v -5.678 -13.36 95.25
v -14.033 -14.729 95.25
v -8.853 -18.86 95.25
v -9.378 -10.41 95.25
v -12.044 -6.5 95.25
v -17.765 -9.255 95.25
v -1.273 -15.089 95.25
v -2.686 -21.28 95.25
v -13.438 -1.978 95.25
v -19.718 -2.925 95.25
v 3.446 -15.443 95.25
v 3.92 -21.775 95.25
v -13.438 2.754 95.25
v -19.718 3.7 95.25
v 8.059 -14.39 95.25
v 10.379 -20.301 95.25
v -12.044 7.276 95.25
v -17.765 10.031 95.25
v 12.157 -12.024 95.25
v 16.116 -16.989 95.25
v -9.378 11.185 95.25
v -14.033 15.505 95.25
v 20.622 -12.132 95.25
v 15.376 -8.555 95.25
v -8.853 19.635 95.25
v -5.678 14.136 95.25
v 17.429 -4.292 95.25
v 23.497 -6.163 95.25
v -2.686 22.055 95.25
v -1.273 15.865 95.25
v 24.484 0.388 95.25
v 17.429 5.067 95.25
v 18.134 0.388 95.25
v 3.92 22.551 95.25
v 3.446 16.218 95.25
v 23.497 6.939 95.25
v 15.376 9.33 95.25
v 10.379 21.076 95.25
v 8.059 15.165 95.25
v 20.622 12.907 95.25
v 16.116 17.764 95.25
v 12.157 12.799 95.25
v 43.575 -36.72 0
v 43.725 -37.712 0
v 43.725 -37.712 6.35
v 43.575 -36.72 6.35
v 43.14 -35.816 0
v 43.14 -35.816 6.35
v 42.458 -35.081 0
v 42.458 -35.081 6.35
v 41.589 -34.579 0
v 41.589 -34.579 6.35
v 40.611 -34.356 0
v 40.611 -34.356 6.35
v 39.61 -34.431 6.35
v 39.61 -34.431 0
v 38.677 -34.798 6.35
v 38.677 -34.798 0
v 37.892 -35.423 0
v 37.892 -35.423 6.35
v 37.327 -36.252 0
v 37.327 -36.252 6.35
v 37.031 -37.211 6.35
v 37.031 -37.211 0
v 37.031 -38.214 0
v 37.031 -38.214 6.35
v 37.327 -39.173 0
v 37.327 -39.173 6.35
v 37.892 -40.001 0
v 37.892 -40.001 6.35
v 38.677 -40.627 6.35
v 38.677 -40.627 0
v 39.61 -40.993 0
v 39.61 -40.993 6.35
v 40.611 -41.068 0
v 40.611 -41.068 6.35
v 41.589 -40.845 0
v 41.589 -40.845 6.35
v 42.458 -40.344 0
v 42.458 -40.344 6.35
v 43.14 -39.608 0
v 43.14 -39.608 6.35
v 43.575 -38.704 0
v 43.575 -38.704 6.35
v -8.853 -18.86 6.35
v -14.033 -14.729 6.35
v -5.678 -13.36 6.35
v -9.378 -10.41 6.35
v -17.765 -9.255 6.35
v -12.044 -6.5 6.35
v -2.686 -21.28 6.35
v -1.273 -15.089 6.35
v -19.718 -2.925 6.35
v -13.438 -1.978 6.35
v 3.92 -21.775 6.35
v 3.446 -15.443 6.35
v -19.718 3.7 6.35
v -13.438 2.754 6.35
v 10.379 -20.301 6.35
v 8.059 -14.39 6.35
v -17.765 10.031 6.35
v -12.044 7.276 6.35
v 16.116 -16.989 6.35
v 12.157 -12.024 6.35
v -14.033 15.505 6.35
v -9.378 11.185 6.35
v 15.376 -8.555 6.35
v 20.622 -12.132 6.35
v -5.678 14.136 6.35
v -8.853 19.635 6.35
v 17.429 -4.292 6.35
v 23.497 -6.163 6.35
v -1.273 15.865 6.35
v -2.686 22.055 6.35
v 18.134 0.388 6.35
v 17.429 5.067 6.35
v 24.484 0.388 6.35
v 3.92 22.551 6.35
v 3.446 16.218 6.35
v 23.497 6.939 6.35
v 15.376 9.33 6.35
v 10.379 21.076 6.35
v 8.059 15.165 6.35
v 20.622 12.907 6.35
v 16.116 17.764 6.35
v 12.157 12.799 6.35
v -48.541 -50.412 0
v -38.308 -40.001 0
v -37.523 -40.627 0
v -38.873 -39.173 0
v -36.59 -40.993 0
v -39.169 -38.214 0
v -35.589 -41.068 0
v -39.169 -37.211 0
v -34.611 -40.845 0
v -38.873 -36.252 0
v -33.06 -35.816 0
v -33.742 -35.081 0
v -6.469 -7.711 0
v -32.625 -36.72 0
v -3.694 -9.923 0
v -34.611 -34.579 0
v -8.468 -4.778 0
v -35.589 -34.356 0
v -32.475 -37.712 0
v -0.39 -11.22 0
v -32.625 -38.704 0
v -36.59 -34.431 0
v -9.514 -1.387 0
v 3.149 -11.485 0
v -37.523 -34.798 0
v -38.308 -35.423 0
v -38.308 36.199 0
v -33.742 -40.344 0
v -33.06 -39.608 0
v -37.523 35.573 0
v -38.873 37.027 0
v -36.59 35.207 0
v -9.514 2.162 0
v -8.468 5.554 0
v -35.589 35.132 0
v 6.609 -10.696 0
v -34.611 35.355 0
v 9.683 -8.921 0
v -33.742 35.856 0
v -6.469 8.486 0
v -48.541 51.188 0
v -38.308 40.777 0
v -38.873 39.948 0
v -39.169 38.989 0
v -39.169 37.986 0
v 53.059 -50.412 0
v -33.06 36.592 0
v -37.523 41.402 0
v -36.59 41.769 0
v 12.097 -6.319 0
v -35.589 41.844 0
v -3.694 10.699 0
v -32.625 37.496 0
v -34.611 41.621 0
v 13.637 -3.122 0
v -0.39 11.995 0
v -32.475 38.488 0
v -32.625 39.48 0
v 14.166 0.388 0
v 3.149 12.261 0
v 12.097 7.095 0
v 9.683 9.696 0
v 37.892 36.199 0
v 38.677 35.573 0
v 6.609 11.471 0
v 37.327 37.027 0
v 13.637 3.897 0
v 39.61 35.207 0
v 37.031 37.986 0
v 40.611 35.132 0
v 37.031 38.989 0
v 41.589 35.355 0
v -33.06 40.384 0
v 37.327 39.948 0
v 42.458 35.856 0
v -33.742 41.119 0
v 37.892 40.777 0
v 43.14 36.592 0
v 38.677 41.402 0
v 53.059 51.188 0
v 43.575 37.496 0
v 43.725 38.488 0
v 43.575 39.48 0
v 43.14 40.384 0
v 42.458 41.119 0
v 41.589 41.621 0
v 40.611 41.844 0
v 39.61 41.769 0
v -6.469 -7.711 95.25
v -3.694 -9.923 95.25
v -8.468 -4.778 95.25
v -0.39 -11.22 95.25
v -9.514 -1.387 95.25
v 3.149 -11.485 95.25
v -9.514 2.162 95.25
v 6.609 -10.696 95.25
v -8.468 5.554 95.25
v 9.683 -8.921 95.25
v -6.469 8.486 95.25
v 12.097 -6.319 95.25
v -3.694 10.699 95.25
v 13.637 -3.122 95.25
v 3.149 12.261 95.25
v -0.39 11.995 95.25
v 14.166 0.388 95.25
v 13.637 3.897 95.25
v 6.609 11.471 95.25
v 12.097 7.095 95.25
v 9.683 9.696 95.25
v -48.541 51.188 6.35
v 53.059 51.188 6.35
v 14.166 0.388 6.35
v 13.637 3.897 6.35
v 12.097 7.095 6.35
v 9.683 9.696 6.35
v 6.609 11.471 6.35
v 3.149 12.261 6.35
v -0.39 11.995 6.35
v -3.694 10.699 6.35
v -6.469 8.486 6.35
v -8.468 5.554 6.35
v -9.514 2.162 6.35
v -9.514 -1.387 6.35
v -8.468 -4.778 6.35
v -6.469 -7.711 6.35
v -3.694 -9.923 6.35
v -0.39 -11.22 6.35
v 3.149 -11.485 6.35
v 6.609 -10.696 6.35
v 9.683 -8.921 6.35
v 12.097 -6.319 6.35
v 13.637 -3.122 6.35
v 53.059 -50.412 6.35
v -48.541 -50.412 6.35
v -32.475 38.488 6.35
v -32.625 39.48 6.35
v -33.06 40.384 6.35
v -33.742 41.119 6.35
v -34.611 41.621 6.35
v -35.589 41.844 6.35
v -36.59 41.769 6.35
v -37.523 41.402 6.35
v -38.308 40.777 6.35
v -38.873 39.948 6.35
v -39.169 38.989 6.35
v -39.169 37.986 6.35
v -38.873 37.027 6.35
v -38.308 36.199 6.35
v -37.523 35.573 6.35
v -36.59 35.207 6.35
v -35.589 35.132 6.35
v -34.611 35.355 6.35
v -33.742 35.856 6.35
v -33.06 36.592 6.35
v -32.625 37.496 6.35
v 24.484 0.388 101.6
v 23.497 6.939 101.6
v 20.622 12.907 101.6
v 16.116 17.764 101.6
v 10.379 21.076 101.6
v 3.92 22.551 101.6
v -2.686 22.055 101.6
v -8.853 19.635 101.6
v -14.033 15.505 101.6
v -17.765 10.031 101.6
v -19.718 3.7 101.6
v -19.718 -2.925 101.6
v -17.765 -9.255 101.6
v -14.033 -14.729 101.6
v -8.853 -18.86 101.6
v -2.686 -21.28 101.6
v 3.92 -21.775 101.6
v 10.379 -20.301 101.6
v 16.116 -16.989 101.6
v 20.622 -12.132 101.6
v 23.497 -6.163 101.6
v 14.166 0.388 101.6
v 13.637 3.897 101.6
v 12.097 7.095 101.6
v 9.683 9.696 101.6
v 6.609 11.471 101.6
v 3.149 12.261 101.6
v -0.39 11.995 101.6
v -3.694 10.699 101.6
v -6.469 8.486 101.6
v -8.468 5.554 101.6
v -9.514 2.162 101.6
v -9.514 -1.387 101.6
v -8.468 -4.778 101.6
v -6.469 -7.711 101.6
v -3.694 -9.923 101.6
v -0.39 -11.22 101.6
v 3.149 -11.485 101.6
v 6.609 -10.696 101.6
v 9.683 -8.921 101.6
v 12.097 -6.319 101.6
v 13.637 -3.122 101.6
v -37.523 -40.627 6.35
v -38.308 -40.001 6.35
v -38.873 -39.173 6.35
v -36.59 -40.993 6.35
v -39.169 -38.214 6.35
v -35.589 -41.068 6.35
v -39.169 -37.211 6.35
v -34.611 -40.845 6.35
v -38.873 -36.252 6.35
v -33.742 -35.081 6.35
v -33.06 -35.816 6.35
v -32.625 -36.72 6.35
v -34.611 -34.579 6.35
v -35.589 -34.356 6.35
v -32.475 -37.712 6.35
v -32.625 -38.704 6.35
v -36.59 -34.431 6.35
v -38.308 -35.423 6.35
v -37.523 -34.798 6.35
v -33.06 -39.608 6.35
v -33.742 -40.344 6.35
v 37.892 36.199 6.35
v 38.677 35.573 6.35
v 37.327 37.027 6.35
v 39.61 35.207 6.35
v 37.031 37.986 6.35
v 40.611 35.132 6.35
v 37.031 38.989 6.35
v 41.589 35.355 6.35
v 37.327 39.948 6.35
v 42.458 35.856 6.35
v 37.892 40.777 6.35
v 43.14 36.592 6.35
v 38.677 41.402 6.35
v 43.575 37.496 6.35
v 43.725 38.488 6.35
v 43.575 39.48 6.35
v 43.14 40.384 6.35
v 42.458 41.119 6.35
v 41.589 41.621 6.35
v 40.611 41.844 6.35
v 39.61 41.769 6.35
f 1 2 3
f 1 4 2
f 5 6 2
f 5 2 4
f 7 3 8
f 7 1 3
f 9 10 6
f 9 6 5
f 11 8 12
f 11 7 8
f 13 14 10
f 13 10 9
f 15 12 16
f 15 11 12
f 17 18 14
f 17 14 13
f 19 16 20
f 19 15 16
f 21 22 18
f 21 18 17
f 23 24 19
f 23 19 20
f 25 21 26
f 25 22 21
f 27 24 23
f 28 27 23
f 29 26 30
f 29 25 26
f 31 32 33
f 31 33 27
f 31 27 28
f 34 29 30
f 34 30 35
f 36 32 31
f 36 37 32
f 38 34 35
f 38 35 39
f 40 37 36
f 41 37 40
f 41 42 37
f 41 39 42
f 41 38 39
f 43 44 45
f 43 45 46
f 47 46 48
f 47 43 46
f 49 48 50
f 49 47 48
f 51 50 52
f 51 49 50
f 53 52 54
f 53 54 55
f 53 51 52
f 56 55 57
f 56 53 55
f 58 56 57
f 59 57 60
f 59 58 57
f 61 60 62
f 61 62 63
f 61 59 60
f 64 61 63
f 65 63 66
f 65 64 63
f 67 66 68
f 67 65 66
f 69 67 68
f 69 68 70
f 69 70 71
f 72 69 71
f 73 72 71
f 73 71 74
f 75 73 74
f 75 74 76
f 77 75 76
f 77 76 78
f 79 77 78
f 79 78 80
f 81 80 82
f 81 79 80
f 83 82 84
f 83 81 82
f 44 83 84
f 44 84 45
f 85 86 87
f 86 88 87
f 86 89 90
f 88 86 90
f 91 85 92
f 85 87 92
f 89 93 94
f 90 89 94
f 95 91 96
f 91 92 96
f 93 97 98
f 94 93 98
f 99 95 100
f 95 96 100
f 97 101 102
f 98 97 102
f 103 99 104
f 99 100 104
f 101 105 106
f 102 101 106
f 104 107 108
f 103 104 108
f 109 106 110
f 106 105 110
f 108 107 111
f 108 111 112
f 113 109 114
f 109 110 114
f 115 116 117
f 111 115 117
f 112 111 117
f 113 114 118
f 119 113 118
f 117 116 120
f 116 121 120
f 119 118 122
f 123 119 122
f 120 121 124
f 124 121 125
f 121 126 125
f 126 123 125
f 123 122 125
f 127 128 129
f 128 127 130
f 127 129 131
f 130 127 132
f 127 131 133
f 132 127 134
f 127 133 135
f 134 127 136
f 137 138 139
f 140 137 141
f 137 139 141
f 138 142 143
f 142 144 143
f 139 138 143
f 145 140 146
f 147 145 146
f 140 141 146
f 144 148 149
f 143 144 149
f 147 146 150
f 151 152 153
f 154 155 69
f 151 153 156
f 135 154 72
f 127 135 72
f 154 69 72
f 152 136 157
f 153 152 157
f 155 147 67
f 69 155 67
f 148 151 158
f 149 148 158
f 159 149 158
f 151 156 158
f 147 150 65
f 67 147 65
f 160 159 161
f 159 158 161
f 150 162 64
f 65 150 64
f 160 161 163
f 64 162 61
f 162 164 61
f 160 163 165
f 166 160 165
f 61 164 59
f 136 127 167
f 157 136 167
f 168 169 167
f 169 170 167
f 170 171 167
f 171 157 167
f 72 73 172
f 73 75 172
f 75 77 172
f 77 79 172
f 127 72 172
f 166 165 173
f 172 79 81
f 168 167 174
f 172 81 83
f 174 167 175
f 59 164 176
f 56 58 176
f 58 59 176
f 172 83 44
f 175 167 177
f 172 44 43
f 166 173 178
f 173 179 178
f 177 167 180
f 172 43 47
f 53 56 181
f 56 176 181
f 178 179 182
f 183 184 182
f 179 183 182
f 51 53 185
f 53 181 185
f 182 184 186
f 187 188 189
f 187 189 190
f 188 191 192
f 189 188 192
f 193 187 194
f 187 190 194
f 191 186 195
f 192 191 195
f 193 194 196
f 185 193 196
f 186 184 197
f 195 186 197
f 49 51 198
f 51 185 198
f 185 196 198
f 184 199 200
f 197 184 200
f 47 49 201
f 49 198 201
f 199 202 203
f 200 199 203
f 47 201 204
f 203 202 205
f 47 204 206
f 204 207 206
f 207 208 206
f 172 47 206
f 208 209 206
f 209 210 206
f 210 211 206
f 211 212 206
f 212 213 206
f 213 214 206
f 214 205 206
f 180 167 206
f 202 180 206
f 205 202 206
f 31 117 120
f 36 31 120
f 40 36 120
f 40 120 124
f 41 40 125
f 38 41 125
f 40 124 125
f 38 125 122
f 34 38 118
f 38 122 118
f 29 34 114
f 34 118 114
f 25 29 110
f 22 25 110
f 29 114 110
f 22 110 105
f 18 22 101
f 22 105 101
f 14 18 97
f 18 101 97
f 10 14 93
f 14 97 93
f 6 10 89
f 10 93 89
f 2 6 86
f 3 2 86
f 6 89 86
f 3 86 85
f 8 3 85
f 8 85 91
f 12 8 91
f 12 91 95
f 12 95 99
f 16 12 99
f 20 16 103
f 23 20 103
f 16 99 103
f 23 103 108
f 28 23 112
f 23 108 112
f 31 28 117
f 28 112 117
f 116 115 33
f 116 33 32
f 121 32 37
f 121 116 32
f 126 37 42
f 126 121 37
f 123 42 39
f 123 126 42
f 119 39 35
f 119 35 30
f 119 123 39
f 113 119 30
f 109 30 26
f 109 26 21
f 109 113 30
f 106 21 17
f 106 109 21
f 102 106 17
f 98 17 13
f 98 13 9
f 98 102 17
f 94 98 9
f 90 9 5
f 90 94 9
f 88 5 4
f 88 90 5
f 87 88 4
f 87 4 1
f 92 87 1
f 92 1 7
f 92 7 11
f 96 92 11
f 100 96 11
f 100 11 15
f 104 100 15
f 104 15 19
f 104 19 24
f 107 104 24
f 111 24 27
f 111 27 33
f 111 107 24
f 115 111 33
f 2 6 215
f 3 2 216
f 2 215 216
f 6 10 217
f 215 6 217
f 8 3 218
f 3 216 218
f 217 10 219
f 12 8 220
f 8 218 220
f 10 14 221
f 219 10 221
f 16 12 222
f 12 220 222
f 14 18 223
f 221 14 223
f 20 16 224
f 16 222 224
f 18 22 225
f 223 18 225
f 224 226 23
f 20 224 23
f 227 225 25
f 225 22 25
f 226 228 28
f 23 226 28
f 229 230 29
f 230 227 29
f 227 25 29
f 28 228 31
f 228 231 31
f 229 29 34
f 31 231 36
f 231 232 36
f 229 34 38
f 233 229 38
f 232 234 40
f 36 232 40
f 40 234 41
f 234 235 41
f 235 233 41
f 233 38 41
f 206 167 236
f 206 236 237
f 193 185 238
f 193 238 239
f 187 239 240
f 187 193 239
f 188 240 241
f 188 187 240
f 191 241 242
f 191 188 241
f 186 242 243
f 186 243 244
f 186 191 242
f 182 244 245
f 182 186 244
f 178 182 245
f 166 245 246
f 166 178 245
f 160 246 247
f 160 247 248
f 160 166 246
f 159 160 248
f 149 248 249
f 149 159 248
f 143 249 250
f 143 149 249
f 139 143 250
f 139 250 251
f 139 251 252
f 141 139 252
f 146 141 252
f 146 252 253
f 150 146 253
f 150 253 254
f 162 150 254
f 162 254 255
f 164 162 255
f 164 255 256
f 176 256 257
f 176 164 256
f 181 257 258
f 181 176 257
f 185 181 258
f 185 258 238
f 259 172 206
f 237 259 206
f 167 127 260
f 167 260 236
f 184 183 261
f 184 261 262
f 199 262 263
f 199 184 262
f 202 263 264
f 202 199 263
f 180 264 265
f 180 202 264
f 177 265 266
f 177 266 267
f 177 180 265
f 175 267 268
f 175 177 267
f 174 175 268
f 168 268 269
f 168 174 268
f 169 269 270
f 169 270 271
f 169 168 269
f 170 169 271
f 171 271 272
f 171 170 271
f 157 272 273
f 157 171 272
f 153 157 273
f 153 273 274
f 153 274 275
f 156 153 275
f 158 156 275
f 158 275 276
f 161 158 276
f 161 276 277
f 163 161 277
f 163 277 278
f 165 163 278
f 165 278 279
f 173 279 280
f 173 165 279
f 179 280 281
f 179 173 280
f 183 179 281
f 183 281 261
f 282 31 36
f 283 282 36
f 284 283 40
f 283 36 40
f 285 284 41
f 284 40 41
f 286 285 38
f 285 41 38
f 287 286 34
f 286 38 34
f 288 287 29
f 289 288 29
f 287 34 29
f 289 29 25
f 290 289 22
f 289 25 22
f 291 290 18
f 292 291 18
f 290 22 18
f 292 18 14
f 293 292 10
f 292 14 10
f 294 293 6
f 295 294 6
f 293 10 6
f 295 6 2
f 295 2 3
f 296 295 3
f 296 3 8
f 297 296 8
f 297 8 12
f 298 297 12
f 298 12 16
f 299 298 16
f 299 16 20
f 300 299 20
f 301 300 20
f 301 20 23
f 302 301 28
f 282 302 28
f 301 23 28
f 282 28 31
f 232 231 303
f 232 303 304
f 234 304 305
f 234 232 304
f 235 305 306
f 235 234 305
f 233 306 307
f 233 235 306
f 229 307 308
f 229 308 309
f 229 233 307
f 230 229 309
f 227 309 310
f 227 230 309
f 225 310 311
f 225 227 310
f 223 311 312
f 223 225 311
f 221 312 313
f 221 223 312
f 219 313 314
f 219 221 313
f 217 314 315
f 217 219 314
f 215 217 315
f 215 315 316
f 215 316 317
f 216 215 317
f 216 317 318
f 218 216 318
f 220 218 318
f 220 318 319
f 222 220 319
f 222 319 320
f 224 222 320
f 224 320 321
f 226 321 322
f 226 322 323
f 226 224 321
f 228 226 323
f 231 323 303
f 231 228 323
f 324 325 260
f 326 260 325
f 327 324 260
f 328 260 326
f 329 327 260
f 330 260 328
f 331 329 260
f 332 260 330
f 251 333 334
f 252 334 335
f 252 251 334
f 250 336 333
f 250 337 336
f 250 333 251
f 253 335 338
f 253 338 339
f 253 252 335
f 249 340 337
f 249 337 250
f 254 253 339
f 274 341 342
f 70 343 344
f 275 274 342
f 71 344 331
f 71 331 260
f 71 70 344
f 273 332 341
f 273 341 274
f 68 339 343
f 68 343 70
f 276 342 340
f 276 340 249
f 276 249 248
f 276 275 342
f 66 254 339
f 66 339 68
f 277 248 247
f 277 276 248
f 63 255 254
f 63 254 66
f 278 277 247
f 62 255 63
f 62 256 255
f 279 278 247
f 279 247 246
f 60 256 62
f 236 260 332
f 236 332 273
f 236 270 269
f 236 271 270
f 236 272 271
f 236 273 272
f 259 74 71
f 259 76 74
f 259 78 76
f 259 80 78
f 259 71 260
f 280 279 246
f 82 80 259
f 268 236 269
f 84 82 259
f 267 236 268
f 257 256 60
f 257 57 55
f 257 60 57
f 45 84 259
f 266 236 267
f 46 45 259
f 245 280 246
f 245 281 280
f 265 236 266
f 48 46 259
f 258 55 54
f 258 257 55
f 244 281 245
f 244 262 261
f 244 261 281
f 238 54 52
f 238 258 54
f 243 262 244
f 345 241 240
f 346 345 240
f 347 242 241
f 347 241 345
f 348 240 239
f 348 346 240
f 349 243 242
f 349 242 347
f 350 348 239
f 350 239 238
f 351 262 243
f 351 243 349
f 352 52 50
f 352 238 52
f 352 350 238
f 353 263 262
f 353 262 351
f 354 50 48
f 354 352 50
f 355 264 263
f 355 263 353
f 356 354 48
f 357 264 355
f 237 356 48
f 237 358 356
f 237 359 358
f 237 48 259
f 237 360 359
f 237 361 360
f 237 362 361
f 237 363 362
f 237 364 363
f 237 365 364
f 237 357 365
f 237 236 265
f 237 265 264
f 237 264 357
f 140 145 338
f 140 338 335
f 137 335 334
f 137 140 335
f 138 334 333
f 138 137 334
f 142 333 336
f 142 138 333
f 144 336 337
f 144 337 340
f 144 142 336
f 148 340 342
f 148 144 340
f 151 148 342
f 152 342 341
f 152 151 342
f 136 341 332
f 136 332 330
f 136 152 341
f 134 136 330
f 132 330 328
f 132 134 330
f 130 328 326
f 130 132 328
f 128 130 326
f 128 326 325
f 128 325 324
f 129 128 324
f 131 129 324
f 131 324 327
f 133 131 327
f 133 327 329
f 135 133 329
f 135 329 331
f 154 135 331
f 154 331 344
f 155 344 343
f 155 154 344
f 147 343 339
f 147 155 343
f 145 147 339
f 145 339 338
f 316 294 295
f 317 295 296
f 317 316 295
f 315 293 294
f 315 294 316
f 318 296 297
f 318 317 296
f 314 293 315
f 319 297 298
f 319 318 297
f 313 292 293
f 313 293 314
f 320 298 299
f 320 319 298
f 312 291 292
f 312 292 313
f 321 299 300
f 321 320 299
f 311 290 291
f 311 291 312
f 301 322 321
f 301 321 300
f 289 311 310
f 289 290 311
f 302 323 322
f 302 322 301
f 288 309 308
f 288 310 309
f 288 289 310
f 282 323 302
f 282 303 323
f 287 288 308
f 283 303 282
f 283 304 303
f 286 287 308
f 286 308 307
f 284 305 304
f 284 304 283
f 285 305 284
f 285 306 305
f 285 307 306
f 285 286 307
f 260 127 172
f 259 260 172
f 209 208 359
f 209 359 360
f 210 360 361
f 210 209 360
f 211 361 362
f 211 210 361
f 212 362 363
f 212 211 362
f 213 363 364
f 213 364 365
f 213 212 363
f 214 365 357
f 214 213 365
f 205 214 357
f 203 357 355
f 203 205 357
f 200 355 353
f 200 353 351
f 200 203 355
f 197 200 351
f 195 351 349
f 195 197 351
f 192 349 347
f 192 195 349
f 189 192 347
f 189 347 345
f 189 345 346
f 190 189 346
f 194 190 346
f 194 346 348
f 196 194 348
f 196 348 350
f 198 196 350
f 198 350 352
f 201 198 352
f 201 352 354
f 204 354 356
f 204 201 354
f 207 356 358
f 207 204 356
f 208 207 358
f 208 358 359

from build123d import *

# Parameters (mm, degrees)
F0_W     = 101.6
F0_H     = 101.6
F0_R     = 3.3655
F0_R_2   = 11.90625
F1_DEPTH = 6.35
F2_R     = 22.225
F2_R_2   = 15.875
F3_DEPTH = 88.9
F4_R     = 22.225
F4_R_2   = 11.90625
F5_DEPTH = 6.35


with BuildPart() as f1:
    # F0 (on Top) → F1 (new body)
    with BuildSketch(Plane.XY):
        with Locations((2.259261, 0.38768)):
            Rectangle(F0_W, F0_H)
        with Locations((-35.840739, -37.71232)):
            Circle(F0_R, mode=Mode.SUBTRACT)
        with Locations((40.359261, -37.71232)):
            Circle(F0_R, mode=Mode.SUBTRACT)
        with Locations((-35.840739, 38.48768)):
            Circle(F0_R, mode=Mode.SUBTRACT)
        with Locations((2.259261, 0.38768)):
            Circle(F0_R_2, mode=Mode.SUBTRACT)
        with Locations((40.359261, 38.48768)):
            Circle(F0_R, mode=Mode.SUBTRACT)
    extrude(amount=F1_DEPTH)


with BuildPart() as f3:
    # F2 (on face) → F3 (new body)
    with BuildSketch(Plane.XY.offset(6.35)):
        with Locations((2.259261, 0.38768)):
            Circle(F2_R)
        with Locations((2.259261, 0.38768)):
            Circle(F2_R_2, mode=Mode.SUBTRACT)
    extrude(amount=F3_DEPTH)


with BuildPart() as f5:
    # F4 (on face) → F5 (new body)
    with BuildSketch(Plane.XY.offset(95.25)):
        with Locations((2.259261, 0.38768)):
            Circle(F4_R)
        with Locations((2.259261, 0.38768)):
            Circle(F4_R_2, mode=Mode.SUBTRACT)
    extrude(amount=F5_DEPTH)


solid = Compound([f1.part, f3.part, f5.part])
